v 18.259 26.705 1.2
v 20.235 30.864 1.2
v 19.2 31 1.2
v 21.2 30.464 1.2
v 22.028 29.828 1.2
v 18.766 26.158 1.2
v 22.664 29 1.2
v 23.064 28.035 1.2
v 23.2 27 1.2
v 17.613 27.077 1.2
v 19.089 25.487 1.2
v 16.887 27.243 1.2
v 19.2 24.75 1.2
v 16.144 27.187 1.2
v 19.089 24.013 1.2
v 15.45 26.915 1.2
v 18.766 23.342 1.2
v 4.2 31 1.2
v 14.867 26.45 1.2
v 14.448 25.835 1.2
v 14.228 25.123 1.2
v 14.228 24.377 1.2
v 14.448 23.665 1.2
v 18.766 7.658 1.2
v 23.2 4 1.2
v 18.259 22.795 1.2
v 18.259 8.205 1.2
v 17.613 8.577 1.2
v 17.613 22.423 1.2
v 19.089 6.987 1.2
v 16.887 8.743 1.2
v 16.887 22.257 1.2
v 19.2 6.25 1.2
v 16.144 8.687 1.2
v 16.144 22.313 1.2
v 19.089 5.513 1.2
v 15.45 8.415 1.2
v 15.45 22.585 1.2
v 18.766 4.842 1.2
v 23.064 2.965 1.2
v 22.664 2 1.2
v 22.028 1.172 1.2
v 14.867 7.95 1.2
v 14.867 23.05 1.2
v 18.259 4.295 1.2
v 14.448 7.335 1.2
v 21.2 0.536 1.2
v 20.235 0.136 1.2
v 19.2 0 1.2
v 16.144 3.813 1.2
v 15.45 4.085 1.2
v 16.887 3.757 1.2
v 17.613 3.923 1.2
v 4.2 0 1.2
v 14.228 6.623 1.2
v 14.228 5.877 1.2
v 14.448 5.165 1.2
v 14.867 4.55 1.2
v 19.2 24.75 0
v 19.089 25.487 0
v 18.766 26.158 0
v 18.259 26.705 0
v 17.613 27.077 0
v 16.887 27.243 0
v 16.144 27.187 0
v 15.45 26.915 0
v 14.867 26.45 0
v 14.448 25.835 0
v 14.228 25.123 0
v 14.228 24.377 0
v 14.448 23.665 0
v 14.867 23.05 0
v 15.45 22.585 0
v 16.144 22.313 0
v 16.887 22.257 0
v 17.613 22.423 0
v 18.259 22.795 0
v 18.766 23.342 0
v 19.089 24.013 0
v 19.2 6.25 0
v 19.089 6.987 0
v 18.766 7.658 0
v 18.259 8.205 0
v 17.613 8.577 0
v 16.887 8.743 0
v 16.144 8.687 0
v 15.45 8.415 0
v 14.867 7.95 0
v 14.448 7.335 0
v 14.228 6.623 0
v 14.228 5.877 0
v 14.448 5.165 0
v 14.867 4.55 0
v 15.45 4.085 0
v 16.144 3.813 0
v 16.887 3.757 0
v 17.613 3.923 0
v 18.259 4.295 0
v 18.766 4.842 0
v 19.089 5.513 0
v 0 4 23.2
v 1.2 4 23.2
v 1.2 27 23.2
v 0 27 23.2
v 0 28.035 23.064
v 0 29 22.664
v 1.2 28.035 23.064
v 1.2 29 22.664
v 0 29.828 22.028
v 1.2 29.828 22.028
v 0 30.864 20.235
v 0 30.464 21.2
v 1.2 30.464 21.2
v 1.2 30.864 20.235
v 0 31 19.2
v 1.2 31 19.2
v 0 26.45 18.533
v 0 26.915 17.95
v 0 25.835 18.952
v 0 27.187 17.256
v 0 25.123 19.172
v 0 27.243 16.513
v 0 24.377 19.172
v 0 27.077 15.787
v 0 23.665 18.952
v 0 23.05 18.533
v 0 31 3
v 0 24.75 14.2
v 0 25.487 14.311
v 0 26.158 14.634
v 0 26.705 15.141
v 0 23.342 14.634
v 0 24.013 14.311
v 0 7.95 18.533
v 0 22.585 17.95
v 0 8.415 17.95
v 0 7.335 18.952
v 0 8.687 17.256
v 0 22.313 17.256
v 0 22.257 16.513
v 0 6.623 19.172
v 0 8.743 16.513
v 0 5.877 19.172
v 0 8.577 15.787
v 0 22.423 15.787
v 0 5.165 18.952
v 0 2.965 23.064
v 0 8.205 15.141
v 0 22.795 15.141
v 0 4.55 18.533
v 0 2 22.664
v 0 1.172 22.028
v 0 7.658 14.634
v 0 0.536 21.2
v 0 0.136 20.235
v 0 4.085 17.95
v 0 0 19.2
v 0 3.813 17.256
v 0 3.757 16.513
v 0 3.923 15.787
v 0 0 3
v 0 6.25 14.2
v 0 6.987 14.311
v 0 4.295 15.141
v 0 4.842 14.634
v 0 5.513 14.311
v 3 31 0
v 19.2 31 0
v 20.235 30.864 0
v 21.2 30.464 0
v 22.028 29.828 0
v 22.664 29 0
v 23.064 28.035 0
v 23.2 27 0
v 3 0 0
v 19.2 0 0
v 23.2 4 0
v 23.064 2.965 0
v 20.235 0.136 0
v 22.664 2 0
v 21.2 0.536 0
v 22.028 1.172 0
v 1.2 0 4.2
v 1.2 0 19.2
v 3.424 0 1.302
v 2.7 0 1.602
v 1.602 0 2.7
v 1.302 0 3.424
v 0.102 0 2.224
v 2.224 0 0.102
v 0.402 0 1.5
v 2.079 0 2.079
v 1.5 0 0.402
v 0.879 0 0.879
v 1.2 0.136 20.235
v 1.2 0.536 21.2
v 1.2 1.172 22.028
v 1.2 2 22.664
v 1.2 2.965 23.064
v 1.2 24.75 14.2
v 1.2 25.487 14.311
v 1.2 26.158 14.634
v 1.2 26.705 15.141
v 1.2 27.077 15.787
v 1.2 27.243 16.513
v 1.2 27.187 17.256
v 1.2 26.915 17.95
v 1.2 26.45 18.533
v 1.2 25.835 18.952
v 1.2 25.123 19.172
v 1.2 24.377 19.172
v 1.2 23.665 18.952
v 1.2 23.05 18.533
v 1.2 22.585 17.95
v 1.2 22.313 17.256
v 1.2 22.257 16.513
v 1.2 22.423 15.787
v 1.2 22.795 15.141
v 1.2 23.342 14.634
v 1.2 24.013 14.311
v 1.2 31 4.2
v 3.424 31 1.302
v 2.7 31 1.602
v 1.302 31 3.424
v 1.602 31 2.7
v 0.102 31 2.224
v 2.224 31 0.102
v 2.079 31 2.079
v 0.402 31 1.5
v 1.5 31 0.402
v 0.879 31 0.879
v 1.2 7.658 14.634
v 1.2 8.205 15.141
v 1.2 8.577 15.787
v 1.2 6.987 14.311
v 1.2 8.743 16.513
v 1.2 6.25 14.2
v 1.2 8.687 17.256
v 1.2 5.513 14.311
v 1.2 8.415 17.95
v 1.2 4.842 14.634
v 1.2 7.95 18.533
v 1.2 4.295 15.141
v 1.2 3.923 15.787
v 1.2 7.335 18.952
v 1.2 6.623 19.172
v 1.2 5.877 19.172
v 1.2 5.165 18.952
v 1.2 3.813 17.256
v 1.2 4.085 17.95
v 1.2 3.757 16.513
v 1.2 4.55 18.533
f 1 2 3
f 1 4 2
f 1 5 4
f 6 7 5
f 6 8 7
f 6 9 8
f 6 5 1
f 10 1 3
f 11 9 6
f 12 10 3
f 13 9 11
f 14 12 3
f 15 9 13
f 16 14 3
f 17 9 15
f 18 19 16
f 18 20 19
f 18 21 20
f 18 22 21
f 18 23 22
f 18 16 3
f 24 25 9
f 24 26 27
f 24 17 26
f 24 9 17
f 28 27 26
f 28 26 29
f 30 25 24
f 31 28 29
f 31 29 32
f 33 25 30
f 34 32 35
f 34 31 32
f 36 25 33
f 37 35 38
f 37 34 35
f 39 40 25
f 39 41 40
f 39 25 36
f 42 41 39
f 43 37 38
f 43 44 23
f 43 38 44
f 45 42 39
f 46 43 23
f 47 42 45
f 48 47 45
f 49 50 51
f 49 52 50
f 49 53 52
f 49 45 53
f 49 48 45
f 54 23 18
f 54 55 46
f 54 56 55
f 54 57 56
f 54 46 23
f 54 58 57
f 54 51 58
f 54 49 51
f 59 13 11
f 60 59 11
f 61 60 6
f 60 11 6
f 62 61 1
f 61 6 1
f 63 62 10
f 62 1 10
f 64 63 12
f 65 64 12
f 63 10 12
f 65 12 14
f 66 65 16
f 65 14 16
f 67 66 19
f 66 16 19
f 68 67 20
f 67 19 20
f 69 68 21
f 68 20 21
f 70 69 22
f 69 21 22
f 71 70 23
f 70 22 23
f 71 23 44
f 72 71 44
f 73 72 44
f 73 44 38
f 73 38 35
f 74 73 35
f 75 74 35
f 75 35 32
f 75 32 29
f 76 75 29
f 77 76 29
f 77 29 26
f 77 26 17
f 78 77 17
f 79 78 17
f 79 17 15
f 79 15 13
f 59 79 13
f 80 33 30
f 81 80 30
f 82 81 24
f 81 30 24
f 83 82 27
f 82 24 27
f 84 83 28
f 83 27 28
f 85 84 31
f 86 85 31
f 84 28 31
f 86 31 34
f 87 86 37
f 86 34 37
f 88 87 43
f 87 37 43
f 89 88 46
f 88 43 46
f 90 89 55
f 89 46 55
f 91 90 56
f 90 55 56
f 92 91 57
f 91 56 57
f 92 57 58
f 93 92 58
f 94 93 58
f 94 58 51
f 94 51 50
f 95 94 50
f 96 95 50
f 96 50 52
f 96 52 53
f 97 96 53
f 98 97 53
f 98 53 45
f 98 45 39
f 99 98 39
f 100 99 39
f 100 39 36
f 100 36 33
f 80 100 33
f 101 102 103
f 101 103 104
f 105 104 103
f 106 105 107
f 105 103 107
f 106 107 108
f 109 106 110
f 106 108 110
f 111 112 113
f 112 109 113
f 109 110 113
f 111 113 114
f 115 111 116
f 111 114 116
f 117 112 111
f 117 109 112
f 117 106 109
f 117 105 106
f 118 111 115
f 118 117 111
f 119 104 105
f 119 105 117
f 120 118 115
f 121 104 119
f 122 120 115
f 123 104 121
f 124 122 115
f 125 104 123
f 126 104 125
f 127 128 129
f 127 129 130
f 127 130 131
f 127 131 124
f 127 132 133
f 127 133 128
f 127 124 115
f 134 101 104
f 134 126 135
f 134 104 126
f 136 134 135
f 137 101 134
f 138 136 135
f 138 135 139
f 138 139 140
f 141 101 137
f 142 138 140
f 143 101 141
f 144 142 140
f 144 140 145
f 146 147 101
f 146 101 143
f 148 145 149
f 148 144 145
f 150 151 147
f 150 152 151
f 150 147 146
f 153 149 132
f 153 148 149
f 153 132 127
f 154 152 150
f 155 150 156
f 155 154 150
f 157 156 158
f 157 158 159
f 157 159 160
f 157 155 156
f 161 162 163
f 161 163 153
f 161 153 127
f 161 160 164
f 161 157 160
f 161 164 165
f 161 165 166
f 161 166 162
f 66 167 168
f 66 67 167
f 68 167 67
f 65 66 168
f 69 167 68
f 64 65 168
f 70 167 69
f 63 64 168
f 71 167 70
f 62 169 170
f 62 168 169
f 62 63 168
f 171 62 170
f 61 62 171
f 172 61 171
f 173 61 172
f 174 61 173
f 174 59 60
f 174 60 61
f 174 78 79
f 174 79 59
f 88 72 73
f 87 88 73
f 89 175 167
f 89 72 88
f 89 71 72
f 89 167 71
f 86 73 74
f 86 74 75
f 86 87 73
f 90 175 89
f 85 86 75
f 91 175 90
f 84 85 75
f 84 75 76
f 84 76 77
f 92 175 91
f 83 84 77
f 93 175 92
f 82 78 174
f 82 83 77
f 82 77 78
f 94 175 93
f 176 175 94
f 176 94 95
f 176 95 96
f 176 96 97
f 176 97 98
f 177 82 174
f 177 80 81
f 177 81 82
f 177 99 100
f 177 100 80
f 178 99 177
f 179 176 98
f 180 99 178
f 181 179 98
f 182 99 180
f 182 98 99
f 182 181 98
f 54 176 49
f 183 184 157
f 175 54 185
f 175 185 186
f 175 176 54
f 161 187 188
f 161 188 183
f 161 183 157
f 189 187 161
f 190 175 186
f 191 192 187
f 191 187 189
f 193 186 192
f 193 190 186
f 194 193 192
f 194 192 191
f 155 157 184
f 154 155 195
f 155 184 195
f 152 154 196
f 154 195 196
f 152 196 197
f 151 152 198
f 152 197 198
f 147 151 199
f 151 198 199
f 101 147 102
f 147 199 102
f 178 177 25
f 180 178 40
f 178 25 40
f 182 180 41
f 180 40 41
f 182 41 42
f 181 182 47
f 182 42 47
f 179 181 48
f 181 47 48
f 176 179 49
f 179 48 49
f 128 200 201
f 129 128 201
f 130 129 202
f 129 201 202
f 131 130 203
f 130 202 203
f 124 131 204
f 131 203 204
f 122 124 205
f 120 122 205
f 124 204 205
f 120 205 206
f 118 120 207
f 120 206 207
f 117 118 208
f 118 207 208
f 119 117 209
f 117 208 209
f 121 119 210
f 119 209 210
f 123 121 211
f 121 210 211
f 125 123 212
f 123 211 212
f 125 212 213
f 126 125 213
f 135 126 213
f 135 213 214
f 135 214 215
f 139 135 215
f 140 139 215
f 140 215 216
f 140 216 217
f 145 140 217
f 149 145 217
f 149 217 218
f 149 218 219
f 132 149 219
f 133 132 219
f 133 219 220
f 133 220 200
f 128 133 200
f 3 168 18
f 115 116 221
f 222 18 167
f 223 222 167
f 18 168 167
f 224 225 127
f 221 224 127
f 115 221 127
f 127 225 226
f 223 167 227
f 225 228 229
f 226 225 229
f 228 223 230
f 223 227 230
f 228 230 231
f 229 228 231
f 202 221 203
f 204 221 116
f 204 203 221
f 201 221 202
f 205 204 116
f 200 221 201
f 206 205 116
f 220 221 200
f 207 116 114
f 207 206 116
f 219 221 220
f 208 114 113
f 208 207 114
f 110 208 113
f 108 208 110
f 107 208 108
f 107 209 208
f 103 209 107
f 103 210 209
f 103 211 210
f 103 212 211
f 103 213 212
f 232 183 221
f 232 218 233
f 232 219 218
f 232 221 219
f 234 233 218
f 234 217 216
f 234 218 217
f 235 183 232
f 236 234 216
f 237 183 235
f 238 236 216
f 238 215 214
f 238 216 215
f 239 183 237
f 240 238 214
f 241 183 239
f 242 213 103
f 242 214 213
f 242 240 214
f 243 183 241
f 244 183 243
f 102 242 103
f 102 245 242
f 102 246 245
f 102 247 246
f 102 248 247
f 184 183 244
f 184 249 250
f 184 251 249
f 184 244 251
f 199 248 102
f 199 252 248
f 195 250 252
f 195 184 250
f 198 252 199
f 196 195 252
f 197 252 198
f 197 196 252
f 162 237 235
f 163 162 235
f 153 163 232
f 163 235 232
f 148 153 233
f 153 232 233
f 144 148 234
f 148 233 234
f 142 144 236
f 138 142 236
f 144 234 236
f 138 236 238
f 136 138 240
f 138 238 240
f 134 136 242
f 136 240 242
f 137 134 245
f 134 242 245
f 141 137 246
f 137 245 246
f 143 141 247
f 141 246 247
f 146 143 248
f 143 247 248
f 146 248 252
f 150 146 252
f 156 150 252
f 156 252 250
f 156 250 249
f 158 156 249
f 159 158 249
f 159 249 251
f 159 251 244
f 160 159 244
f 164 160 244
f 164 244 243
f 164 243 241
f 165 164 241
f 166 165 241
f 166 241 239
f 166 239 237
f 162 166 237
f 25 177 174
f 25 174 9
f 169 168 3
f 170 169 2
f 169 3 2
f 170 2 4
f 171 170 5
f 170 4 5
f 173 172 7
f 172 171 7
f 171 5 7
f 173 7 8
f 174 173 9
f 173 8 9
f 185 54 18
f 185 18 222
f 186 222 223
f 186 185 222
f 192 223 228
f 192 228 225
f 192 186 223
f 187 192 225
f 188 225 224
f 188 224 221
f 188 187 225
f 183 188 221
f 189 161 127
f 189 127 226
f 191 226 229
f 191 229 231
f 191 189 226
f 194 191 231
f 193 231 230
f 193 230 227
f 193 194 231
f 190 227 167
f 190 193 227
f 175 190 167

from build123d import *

# Parameters (mm, degrees)
EXTRUDE_1_DEPTH     = 31
SKETCH_2_R          = 2.5
CUT_EXTRUDE_1_DEPTH = 30.5
SKETCH_4_R          = 2.5
CUT_EXTRUDE_2_DEPTH = 30.5


with BuildPart() as part:
    # 草图1 → 凸台-拉伸1 (new body)
    with BuildSketch(Plane(origin=(0, 0, 0), x_dir=(1, 0, 0), z_dir=(0, 1, 0))):
        with BuildLine():
            Line((3, 0), (23.2, 0))
            Line((23.2, 0), (23.2, -1.2))
            Line((23.2, -1.2), (4.2, -1.2))
            ThreePointArc((4.2, -1.2), (2.078679656, -2.078679656), (1.2, -4.2))
            Line((1.2, -4.2), (1.2, -23.2))
            Line((1.2, -23.2), (0, -23.2))
            Line((0, -23.2), (0, -3))
            ThreePointArc((0, -3), (0.878679656, -0.878679656), (3, 0))
        make_face()
    extrude(amount=EXTRUDE_1_DEPTH)

    # 草图2 → 切除-拉伸1 (cut)
    with BuildSketch(Plane.XY.offset(1.2)):
        with BuildLine():
            ThreePointArc((19.2, 31), (22.028427125, 29.828427125), (23.2, 27))
            Line((23.2, 27), (23.2, 31))
            Line((23.2, 31), (19.2, 31))
        make_face()
        with Locations((16.7, 24.75)):
            Circle(SKETCH_2_R)
        with BuildLine():
            Line((23.2, 0), (23.2, 4))
            ThreePointArc((23.2, 4), (22.028427125, 1.171572875), (19.2, 0))
            Line((19.2, 0), (23.2, 0))
        make_face()
        with Locations((16.7, 6.25)):
            Circle(SKETCH_2_R)
    extrude(amount=-CUT_EXTRUDE_1_DEPTH, mode=Mode.SUBTRACT)

    # 草图4 → 切除-拉伸2 (cut)
    with BuildSketch(Plane(origin=(1.2, 0, 1), x_dir=(0, 0, -1), z_dir=(1, 0, 0))):
        with Locations((-15.7, 6.25)):
            Circle(SKETCH_4_R)
        with BuildLine():
            ThreePointArc((-18.2, 0), (-21.028427125, 1.171572875), (-22.2, 4))
            Line((-22.2, 4), (-22.2, 0))
            Line((-22.2, 0), (-18.2, 0))
        make_face()
        with BuildLine():
            Line((-22.2, 31), (-22.2, 27))
            ThreePointArc((-22.2, 27), (-21.028427125, 29.828427125), (-18.2, 31))
            Line((-18.2, 31), (-22.2, 31))
        make_face()
        with Locations((-15.7, 24.75)):
            Circle(SKETCH_4_R)
    extrude(amount=-CUT_EXTRUDE_2_DEPTH, mode=Mode.SUBTRACT)


solid = part.part
